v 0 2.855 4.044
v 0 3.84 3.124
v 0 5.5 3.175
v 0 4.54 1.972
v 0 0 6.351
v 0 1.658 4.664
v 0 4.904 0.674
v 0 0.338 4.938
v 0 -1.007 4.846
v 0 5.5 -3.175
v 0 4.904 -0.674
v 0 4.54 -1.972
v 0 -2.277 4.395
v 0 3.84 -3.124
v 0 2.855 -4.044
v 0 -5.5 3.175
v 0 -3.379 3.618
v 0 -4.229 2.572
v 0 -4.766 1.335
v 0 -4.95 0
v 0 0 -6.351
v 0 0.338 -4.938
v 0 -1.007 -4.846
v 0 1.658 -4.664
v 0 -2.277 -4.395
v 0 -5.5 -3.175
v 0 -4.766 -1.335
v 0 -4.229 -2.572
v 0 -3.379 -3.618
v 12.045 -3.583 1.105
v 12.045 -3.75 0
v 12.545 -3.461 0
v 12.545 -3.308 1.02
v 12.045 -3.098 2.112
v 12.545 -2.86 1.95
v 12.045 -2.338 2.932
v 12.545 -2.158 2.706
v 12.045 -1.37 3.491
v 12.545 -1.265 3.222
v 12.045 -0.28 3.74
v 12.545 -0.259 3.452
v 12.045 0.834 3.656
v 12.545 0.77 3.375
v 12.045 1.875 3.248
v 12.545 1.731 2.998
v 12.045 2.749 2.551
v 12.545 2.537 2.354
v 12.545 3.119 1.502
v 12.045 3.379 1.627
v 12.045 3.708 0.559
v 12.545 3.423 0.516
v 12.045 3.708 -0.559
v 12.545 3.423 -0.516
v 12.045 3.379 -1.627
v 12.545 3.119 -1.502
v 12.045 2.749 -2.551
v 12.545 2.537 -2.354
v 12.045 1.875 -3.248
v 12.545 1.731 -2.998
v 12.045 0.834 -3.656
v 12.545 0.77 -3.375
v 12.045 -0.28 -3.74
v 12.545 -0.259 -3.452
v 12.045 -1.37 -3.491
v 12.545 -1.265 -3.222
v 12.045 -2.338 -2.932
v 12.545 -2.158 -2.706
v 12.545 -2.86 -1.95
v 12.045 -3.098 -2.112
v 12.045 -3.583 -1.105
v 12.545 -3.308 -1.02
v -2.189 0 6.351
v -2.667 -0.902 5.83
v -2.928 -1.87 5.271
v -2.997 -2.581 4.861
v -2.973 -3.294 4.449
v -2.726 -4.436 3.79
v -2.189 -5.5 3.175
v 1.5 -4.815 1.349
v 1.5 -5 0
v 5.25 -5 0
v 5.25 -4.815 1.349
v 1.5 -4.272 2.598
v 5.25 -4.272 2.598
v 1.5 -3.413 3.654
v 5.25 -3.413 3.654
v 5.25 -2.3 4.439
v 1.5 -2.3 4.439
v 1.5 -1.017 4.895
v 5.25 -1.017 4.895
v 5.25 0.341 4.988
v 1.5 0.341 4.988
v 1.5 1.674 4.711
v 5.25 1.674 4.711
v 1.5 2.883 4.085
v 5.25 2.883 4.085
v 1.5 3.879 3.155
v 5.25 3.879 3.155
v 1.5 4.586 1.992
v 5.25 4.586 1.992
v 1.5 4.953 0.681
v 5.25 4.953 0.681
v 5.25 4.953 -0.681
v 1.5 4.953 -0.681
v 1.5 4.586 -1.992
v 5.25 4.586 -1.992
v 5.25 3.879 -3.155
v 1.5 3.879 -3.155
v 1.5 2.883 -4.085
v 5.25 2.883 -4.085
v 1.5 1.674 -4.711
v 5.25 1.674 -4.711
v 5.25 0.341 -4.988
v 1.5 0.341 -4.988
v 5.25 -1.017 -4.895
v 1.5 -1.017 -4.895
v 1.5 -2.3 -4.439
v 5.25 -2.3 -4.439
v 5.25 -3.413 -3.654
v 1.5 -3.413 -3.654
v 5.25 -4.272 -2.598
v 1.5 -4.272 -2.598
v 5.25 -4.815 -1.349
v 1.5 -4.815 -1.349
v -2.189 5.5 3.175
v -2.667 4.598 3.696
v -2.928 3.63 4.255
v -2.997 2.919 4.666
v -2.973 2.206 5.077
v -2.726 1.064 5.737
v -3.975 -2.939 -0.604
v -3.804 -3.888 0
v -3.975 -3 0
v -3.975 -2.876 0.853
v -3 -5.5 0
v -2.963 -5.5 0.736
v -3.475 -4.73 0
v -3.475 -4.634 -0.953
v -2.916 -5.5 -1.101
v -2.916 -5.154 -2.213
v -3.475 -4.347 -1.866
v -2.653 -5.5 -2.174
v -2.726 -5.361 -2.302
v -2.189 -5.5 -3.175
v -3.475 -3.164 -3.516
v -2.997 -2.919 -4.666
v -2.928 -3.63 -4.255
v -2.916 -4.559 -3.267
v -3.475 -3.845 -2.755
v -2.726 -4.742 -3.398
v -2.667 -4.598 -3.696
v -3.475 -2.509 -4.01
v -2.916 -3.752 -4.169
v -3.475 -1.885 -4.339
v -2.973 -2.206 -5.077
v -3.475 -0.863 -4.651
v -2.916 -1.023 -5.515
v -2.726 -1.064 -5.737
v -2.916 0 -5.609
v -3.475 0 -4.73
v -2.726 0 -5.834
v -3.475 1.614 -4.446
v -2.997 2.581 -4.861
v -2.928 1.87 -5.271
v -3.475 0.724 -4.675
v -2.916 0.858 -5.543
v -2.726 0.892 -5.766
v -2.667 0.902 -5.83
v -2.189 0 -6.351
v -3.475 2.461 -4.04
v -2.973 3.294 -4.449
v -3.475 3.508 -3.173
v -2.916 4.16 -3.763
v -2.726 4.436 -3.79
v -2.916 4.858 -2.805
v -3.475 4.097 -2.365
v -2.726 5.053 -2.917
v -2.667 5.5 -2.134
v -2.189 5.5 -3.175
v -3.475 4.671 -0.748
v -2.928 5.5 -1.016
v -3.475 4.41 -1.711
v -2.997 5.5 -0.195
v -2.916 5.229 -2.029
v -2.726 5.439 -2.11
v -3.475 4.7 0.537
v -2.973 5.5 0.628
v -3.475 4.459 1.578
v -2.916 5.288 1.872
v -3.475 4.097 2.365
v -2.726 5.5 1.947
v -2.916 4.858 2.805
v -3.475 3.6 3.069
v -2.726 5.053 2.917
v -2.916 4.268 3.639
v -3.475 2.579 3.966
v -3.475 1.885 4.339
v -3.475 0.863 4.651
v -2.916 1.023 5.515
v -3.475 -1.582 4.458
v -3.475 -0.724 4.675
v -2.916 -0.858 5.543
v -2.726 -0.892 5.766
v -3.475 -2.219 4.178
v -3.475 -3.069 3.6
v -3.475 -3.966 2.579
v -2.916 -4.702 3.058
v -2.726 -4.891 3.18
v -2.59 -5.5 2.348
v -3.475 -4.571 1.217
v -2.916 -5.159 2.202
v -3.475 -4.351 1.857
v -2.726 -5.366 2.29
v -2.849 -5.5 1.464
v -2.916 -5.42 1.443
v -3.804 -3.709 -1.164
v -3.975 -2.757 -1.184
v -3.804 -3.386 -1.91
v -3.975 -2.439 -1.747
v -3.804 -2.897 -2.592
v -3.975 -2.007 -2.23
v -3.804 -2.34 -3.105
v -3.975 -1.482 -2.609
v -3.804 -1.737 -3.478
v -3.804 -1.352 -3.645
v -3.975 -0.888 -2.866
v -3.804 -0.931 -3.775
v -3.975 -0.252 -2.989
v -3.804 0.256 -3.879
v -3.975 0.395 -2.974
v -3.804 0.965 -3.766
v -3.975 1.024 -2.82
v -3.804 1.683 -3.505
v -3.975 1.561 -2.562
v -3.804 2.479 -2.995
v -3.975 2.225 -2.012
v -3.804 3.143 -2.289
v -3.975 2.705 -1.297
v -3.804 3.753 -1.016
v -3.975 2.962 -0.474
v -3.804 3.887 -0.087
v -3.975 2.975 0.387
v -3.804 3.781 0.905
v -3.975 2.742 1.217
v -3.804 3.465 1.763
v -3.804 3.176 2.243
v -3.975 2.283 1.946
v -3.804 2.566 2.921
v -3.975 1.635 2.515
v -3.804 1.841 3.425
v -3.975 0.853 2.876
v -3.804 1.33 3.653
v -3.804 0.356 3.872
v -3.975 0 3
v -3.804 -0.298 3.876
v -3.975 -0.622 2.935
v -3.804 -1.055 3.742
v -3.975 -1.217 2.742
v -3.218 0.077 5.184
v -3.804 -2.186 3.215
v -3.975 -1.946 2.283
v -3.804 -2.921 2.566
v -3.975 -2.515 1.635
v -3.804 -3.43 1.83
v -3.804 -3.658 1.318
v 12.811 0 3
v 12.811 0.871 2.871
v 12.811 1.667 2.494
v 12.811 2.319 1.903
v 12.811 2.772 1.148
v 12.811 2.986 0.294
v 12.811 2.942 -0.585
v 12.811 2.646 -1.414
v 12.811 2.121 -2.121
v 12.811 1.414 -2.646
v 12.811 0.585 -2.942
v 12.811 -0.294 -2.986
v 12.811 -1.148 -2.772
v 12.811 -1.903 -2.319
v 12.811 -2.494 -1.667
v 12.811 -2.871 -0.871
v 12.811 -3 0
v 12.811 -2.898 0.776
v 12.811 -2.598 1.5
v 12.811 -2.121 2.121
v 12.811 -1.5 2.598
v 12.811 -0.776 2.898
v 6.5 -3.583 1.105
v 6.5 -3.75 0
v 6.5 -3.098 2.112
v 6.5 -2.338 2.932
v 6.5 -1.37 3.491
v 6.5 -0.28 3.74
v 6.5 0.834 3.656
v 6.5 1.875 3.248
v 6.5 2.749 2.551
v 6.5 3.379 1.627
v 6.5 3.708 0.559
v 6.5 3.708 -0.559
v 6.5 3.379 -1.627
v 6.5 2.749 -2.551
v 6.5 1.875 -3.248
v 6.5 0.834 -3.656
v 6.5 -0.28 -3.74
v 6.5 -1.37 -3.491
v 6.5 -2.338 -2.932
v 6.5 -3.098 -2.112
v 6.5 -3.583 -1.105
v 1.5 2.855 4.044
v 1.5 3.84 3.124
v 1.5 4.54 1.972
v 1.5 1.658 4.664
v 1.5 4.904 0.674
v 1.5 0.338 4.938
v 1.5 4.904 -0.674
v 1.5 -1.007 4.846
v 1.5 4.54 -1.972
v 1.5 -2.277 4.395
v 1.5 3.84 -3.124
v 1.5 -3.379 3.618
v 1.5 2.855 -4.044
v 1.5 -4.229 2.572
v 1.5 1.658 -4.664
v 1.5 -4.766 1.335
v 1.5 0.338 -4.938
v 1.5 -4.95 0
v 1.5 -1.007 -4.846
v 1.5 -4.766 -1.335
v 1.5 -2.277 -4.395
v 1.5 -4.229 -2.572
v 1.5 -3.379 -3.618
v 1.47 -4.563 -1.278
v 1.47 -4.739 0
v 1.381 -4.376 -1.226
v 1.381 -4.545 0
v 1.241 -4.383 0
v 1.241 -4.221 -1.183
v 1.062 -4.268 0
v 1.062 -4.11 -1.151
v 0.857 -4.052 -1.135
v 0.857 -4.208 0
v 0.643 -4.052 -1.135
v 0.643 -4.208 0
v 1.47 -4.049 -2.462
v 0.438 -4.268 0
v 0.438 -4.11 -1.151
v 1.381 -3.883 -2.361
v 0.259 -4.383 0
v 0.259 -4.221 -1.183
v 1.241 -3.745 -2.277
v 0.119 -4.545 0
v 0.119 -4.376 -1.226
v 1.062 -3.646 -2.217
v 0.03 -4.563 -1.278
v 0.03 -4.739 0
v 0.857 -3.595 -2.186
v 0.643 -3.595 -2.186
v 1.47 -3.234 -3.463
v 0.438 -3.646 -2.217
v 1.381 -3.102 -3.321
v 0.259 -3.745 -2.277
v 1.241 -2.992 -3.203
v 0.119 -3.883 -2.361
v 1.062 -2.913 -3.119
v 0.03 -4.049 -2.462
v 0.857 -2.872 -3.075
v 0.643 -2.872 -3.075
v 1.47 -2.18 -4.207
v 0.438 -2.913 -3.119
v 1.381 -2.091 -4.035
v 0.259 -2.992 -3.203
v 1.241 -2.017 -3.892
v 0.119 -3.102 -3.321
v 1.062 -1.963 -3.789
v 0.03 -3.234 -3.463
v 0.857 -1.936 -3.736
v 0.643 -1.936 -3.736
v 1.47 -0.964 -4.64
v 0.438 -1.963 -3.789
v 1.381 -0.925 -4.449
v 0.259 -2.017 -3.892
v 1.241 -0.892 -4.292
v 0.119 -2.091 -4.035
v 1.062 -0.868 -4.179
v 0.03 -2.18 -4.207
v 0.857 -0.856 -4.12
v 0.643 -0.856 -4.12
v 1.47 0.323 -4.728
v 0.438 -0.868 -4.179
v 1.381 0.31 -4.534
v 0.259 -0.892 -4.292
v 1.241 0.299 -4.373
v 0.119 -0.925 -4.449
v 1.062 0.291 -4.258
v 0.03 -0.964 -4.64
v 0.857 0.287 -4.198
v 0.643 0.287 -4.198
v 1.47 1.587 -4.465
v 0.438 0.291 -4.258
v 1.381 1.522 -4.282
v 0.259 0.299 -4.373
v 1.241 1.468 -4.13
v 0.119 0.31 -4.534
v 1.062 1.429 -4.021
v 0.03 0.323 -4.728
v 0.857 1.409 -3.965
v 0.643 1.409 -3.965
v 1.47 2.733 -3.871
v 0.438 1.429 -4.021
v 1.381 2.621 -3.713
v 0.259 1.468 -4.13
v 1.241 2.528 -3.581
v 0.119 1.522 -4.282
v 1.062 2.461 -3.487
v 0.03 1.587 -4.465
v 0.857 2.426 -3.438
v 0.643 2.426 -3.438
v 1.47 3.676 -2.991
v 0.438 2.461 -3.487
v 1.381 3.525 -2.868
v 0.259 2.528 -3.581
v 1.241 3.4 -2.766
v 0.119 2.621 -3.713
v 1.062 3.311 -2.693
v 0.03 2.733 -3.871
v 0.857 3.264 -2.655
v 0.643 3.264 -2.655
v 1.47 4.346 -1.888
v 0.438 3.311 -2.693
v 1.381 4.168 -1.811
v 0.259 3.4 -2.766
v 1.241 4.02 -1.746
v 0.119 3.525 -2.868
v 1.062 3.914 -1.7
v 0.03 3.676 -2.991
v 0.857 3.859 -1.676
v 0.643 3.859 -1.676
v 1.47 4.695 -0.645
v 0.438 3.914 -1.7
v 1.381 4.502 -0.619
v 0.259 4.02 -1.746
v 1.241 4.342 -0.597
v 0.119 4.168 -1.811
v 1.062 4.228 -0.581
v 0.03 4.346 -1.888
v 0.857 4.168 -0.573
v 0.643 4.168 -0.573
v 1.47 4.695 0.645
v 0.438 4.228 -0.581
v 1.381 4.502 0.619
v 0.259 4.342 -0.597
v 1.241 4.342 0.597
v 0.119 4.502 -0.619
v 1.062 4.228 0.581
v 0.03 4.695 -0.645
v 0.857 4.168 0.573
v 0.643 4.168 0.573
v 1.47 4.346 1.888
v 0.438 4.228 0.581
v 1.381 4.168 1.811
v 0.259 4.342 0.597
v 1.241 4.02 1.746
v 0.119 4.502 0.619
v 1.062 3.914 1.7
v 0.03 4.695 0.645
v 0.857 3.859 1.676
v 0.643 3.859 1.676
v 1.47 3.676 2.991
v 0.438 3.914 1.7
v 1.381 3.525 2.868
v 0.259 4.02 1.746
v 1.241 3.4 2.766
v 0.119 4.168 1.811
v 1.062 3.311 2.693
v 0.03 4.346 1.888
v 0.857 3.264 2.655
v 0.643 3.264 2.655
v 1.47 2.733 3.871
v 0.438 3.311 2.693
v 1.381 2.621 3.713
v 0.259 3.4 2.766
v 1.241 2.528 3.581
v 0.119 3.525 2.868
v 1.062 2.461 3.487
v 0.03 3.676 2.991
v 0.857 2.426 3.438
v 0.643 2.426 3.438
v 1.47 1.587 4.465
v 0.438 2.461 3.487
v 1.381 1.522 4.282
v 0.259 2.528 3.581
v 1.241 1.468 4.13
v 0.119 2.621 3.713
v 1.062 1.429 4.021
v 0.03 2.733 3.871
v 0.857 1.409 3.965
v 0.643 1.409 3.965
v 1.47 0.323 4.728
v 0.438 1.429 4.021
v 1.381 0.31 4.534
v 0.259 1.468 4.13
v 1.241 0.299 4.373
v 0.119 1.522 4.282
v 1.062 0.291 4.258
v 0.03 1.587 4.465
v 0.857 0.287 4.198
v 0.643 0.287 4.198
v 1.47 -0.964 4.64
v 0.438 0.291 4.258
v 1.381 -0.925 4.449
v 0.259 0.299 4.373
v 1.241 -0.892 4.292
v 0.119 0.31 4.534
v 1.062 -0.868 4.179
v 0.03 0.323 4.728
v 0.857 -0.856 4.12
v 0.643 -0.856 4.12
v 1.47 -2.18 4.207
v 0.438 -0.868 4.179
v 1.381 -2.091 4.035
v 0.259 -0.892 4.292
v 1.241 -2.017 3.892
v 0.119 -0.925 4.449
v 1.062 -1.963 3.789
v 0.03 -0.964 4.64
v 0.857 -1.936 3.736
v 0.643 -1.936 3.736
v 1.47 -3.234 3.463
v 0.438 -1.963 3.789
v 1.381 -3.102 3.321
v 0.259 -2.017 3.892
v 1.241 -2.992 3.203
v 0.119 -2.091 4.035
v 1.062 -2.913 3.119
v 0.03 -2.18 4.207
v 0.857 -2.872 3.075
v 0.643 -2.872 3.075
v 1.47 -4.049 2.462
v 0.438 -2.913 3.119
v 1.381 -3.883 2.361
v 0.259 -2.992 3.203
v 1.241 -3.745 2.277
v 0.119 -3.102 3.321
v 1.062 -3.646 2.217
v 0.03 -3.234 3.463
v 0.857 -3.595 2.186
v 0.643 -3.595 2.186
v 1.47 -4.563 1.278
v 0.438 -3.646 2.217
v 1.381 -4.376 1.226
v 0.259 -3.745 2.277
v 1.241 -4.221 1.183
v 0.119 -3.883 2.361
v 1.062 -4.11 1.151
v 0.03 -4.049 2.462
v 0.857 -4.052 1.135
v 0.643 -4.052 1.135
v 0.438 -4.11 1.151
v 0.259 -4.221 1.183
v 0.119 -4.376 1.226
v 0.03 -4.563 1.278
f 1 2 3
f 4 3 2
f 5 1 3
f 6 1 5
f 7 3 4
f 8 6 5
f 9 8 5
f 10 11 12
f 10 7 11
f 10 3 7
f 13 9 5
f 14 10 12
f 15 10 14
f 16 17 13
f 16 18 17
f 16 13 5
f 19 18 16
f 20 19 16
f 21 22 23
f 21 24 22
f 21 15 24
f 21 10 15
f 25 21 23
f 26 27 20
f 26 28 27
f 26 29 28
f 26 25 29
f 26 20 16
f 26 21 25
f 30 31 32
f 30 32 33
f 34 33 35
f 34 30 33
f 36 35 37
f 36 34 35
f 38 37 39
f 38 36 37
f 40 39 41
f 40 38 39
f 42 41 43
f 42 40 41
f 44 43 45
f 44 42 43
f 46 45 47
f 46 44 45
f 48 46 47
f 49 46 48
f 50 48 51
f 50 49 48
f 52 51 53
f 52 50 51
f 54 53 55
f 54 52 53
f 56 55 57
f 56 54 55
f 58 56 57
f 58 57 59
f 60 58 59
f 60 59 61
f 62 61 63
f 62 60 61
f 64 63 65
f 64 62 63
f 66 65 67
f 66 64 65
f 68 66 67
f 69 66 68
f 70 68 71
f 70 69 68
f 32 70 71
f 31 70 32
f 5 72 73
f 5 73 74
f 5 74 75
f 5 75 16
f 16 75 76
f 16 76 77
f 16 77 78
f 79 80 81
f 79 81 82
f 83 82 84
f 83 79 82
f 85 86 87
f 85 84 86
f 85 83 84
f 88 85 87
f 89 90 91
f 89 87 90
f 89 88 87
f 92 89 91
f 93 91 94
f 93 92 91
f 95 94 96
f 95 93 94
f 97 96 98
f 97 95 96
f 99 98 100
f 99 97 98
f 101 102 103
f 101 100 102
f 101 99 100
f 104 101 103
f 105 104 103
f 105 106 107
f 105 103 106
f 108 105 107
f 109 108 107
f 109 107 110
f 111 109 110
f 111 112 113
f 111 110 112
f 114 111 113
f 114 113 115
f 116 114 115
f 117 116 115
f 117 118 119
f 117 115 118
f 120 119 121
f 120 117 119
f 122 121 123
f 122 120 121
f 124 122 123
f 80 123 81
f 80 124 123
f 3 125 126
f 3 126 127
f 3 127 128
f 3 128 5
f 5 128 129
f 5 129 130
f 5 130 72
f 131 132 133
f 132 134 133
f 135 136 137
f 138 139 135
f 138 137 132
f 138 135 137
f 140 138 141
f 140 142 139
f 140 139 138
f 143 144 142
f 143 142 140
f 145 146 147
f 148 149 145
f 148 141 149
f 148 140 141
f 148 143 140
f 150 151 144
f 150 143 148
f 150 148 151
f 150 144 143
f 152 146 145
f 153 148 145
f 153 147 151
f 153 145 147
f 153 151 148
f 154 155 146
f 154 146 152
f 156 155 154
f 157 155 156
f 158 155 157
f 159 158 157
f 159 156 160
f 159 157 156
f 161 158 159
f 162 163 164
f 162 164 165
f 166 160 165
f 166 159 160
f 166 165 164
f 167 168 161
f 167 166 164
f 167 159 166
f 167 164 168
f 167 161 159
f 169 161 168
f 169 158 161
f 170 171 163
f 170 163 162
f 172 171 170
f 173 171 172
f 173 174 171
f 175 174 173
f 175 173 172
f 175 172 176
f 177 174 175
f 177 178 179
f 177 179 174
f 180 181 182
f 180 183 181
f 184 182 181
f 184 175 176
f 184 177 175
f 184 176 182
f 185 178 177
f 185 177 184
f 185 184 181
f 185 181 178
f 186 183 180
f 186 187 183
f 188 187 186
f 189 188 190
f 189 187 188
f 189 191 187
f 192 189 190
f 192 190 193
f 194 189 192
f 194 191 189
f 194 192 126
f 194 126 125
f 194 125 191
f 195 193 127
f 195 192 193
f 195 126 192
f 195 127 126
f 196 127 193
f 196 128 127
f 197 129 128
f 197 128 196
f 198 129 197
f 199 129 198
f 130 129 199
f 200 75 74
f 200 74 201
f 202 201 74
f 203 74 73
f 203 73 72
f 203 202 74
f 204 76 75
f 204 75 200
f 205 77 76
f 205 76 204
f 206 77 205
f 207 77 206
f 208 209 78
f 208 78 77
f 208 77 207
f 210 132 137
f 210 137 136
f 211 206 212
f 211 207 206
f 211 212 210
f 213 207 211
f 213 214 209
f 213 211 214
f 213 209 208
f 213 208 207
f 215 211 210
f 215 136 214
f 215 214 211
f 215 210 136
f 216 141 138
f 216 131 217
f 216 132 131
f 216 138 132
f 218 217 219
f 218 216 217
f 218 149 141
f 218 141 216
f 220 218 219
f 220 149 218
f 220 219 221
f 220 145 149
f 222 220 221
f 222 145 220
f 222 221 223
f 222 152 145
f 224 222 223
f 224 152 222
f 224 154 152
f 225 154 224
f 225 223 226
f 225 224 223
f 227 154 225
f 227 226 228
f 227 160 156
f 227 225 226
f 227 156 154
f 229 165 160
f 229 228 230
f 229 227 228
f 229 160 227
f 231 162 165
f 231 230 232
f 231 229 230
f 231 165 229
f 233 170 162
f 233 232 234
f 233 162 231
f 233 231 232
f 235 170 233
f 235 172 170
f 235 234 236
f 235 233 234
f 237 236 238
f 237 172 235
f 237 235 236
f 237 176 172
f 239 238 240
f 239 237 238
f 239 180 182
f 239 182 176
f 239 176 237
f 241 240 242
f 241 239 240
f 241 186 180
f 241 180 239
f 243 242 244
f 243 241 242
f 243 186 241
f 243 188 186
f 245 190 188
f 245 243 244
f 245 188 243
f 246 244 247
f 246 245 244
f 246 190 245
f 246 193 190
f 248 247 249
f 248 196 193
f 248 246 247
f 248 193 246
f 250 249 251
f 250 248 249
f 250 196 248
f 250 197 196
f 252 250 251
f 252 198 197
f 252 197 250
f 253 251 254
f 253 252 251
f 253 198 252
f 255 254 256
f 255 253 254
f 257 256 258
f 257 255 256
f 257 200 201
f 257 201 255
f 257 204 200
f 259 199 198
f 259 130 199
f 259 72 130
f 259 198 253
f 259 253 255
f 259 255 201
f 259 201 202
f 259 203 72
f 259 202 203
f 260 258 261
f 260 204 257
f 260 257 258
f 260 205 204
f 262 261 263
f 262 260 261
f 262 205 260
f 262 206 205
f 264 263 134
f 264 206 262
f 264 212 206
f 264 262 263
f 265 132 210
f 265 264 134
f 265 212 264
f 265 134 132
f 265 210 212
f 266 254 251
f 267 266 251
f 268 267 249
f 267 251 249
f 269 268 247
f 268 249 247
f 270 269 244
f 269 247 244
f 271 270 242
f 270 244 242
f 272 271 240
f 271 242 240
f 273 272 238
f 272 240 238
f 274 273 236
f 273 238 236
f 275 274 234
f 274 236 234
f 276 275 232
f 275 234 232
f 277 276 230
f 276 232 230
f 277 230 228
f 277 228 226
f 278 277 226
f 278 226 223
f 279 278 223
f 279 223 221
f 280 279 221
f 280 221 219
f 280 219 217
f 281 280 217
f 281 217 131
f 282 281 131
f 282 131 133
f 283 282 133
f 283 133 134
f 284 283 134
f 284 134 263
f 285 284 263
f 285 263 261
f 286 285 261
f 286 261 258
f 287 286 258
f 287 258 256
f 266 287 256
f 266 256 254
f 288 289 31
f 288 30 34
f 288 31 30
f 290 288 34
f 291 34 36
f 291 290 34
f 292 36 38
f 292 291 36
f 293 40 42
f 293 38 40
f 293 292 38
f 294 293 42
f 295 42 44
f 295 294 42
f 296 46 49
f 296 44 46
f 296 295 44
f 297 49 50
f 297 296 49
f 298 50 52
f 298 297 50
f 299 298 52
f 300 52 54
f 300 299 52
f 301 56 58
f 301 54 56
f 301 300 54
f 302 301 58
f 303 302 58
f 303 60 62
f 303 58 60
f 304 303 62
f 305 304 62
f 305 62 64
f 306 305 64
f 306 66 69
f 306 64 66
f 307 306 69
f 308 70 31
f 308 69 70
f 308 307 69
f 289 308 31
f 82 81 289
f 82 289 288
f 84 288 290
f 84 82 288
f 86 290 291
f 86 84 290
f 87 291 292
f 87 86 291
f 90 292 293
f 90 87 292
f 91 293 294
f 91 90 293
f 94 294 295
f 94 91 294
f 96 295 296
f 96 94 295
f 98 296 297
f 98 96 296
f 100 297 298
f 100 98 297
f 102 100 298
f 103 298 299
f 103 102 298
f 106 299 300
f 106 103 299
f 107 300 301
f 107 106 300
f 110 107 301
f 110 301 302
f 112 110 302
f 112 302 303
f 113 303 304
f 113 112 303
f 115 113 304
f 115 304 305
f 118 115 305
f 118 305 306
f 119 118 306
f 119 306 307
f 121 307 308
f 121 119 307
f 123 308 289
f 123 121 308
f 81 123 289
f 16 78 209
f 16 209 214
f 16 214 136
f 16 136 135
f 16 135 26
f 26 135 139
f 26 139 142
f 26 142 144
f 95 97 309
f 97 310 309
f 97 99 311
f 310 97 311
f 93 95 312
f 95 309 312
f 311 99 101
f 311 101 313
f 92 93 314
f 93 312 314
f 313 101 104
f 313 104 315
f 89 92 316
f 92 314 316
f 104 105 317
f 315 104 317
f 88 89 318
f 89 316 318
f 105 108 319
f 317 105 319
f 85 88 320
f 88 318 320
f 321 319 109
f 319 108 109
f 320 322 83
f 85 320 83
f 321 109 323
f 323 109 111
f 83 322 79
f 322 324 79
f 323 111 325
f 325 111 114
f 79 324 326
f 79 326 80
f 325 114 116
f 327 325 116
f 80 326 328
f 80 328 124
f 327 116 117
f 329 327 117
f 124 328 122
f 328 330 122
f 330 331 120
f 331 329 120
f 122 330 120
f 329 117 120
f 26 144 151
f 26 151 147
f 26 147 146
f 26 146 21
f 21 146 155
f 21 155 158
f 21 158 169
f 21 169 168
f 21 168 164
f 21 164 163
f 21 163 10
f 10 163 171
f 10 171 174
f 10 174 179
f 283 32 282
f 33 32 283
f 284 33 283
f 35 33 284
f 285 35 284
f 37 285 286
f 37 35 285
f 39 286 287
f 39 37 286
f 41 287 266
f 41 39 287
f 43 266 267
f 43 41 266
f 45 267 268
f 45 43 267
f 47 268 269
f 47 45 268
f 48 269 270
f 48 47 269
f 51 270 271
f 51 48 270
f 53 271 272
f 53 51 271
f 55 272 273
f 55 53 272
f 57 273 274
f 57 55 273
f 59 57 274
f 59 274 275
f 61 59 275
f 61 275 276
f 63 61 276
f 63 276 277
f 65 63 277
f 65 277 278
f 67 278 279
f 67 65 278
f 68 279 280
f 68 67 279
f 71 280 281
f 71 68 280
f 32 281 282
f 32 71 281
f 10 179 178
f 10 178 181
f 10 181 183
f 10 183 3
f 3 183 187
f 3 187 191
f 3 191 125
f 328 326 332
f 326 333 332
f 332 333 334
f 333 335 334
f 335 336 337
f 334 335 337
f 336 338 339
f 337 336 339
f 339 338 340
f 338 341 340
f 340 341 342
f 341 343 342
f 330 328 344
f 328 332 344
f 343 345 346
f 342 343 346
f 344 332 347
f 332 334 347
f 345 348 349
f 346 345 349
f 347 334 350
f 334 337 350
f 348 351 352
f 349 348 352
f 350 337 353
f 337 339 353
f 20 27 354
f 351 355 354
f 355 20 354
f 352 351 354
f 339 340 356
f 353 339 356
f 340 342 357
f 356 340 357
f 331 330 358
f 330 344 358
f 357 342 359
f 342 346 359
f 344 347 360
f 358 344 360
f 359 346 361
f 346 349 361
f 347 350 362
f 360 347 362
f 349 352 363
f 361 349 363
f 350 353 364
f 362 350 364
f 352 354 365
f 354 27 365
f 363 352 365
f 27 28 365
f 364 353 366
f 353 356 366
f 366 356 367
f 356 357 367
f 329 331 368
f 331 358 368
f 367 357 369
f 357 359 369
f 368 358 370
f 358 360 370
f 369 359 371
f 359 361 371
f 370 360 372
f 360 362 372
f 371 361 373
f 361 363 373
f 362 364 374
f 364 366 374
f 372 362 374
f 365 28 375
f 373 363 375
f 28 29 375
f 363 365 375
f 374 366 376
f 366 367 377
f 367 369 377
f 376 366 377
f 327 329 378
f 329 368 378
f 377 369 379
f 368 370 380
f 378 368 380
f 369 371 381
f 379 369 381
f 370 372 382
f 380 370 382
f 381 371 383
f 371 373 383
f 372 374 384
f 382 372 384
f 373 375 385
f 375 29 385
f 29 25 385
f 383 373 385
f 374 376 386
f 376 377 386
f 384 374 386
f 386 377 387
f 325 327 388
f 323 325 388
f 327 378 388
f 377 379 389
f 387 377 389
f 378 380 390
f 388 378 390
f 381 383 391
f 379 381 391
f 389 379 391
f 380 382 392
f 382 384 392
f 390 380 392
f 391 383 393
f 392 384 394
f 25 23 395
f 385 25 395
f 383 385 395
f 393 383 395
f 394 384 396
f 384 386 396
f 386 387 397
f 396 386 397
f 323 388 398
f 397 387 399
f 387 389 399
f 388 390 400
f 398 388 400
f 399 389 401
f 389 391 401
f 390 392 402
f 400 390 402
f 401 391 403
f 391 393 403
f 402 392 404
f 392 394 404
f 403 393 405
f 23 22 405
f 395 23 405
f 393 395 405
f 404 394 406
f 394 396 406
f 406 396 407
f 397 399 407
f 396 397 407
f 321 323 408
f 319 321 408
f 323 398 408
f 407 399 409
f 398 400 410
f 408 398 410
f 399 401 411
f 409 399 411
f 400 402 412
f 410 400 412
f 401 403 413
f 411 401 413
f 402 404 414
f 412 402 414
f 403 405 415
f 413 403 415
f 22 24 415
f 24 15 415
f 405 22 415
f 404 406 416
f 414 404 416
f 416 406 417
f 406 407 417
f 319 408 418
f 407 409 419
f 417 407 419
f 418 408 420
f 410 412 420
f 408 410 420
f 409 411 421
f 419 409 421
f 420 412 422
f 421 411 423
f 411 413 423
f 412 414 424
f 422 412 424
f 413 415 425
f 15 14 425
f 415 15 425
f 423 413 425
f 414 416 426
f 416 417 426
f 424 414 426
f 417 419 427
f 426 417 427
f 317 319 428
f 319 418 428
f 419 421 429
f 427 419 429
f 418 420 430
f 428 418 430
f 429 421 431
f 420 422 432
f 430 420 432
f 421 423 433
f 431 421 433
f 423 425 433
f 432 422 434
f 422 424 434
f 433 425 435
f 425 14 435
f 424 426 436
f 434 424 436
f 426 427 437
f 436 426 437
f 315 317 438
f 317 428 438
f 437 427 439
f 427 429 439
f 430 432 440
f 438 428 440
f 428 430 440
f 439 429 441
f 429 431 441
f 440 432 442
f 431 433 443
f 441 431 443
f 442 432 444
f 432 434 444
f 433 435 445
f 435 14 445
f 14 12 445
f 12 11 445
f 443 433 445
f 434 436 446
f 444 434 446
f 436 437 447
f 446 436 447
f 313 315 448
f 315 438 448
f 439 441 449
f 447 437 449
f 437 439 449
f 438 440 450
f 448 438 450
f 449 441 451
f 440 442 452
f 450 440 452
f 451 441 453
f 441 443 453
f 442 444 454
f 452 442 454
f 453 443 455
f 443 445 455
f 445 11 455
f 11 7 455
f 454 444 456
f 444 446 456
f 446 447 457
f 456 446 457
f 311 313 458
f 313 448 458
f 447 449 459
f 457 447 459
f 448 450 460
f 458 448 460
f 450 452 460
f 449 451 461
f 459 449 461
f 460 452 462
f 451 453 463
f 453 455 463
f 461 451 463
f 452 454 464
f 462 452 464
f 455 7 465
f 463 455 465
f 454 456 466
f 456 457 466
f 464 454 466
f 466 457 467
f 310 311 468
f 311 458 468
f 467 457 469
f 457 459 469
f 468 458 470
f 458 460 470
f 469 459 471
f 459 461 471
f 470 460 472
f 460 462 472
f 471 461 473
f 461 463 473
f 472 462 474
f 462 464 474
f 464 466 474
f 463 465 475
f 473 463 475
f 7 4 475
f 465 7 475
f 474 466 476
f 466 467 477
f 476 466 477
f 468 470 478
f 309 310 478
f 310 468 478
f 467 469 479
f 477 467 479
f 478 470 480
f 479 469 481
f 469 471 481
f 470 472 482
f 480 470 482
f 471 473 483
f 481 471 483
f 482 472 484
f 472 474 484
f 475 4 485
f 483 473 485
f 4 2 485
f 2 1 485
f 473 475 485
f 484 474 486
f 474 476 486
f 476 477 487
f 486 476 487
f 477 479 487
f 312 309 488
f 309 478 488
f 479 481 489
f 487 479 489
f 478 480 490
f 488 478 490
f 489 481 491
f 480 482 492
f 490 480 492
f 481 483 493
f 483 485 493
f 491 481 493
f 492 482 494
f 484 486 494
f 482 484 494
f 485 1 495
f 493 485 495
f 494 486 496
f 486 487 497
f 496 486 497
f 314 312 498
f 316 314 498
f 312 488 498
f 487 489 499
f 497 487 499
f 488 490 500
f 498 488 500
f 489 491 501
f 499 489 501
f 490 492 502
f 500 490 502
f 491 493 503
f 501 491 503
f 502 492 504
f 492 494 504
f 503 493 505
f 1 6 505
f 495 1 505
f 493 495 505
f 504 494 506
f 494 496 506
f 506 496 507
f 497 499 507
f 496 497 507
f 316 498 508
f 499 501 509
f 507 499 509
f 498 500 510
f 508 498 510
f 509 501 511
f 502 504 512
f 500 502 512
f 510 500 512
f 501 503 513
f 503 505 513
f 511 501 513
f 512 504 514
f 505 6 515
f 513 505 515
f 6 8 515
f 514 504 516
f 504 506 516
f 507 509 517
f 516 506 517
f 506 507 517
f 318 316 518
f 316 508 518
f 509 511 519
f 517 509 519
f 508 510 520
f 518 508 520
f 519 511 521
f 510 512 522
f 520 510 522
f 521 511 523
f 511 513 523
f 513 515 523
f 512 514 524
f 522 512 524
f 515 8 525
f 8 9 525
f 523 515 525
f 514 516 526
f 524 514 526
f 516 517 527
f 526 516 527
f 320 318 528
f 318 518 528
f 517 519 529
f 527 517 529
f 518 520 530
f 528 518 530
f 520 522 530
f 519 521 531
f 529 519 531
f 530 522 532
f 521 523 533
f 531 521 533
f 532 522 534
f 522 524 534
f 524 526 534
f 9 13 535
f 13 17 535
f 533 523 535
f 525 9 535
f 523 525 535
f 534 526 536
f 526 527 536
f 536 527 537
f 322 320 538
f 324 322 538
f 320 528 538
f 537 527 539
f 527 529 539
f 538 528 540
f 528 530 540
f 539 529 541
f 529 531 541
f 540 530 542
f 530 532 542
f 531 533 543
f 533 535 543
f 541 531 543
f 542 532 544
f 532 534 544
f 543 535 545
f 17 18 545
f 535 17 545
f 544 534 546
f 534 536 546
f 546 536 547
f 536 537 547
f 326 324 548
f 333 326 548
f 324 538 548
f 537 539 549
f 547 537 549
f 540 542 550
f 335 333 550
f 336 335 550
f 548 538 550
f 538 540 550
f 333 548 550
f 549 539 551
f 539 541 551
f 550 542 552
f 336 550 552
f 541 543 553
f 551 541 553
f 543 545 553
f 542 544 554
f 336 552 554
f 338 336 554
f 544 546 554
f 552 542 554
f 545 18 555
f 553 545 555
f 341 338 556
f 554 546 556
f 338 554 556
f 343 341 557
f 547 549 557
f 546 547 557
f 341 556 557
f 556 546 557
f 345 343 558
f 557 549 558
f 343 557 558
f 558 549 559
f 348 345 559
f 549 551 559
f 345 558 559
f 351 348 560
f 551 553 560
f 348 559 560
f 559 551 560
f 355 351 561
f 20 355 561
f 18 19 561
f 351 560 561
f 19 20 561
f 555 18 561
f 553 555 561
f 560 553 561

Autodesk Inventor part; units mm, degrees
ref_plane "YZ Plane" through (0, 0, 0) normal (1, 0, 0) x (0, 1, 0)
ref_plane "XZ Plane" through (0, 0, 0) normal (0, 1, 0) x (-1, 0, 0)
ref_plane "XY Plane" through (0, 0, 0) normal (0, 0, 1) x (1, 0, 0)
sketch "Náčrt1" plane through (0, 0, 0) normal (0, 0, 1) x (1, 0, 0)
  line L0 (0, 0) -> (0, 2.5)
  line L1 (0, 2.5) -> (0.555, 3.4613)
  line L2 (6.6, 3.75) -> (7.85, 5)
  line L3 (7.85, 5) -> (11.6, 5)
  line L4 (11.6, 5) -> (11.6, 4.95)
  arc A0 (11.6, 4.95) -> (13.1, 4.95) centre (12.35, 4.95) ccw
  line L5 (13.1, 4.95) -> (13.1, 6.5)
  line L6 (13.1, 6.5) -> (17.1, 6.5)
  line L7 (17.1, 6.5) -> (17.1, 0)
  line L8 (17.1, 0) -> (0, 0)
  line L9 (1.055, 3.75) -> (0.555, 3.4613)
  line L10 (1.055, 3.75) -> (6.6, 3.75)
  arc A1 (17.1, 2.5) -> (15.1, 6.5) centre (12.1, 2.5) ccw
  dimension "d2" = 30
  dimension "d3" = 45
  dimension "d5" = 6.6
  dimension "d6" = 10
  dimension "d7" = 5
  dimension "d8" = 1.5
  dimension "d9" = 13.1
  dimension "d10" = 17.1
  dimension "d11" = 13
  dimension "d12" = 8.4
  dimension "d32" = 30
  dimension "d34" = 0.5
  dimension "d35" = 7.5
  dimension "d46" = 5
  dimension "d47" = 5
revolve "Rotace1" add sketch "Náčrt1" angle 360 about axis through (17.1, 0, 0) along (-1, 0, 0) contours L0 L1 L9 L10 L2 L3 L4 A0 L5 L6 A1 L7 L8
sketch "Náčrt2" plane through (17.1, 0, 0) normal (1, 0, 0) x (0, 0, -1)
  line L0 (3.1754, 5.5) -> (6.3509, 0)
  line L1 (6.3509, 0) -> (3.1754, -5.5)
  line L2 (3.1754, -5.5) -> (-3.1754, -5.5)
  line L3 (-3.1754, -5.5) -> (-6.3509, 0)
  line L4 (-6.3509, 0) -> (-3.1754, 5.5)
  line L5 (-3.1754, 5.5) -> (3.1754, 5.5)
  circle A0 centre (0, 0) radius 7.7861
  dimension "d14" = 5.5
extrude "Vysunutí1" cut sketch "Náčrt2" against normal through all
sketch "Náčrt4" plane through (0, 0, 0) normal (-1, 0, 0) x (0, 0, 1)
  circle A0 centre (0, 0) radius 3.75 projected
  point P0 (0, 0)
hole "Díra1" at (0, 0, 0) direction (1, 0, 0) diameter 6 end through all
thread "Závit1" size "M10x1" class "6g" standard "ISO Metric profile" full length
move or copy body "Posunout těleso1" bodies to move or copy 1 copy no rotation origin (0, 0, 0) rotation axis (0, 0, 1) rotation angle 180 translate (13.1, 0, 0)
properties part number "Cap03" material "ČSN 12 050 (1.1201, C45)"
